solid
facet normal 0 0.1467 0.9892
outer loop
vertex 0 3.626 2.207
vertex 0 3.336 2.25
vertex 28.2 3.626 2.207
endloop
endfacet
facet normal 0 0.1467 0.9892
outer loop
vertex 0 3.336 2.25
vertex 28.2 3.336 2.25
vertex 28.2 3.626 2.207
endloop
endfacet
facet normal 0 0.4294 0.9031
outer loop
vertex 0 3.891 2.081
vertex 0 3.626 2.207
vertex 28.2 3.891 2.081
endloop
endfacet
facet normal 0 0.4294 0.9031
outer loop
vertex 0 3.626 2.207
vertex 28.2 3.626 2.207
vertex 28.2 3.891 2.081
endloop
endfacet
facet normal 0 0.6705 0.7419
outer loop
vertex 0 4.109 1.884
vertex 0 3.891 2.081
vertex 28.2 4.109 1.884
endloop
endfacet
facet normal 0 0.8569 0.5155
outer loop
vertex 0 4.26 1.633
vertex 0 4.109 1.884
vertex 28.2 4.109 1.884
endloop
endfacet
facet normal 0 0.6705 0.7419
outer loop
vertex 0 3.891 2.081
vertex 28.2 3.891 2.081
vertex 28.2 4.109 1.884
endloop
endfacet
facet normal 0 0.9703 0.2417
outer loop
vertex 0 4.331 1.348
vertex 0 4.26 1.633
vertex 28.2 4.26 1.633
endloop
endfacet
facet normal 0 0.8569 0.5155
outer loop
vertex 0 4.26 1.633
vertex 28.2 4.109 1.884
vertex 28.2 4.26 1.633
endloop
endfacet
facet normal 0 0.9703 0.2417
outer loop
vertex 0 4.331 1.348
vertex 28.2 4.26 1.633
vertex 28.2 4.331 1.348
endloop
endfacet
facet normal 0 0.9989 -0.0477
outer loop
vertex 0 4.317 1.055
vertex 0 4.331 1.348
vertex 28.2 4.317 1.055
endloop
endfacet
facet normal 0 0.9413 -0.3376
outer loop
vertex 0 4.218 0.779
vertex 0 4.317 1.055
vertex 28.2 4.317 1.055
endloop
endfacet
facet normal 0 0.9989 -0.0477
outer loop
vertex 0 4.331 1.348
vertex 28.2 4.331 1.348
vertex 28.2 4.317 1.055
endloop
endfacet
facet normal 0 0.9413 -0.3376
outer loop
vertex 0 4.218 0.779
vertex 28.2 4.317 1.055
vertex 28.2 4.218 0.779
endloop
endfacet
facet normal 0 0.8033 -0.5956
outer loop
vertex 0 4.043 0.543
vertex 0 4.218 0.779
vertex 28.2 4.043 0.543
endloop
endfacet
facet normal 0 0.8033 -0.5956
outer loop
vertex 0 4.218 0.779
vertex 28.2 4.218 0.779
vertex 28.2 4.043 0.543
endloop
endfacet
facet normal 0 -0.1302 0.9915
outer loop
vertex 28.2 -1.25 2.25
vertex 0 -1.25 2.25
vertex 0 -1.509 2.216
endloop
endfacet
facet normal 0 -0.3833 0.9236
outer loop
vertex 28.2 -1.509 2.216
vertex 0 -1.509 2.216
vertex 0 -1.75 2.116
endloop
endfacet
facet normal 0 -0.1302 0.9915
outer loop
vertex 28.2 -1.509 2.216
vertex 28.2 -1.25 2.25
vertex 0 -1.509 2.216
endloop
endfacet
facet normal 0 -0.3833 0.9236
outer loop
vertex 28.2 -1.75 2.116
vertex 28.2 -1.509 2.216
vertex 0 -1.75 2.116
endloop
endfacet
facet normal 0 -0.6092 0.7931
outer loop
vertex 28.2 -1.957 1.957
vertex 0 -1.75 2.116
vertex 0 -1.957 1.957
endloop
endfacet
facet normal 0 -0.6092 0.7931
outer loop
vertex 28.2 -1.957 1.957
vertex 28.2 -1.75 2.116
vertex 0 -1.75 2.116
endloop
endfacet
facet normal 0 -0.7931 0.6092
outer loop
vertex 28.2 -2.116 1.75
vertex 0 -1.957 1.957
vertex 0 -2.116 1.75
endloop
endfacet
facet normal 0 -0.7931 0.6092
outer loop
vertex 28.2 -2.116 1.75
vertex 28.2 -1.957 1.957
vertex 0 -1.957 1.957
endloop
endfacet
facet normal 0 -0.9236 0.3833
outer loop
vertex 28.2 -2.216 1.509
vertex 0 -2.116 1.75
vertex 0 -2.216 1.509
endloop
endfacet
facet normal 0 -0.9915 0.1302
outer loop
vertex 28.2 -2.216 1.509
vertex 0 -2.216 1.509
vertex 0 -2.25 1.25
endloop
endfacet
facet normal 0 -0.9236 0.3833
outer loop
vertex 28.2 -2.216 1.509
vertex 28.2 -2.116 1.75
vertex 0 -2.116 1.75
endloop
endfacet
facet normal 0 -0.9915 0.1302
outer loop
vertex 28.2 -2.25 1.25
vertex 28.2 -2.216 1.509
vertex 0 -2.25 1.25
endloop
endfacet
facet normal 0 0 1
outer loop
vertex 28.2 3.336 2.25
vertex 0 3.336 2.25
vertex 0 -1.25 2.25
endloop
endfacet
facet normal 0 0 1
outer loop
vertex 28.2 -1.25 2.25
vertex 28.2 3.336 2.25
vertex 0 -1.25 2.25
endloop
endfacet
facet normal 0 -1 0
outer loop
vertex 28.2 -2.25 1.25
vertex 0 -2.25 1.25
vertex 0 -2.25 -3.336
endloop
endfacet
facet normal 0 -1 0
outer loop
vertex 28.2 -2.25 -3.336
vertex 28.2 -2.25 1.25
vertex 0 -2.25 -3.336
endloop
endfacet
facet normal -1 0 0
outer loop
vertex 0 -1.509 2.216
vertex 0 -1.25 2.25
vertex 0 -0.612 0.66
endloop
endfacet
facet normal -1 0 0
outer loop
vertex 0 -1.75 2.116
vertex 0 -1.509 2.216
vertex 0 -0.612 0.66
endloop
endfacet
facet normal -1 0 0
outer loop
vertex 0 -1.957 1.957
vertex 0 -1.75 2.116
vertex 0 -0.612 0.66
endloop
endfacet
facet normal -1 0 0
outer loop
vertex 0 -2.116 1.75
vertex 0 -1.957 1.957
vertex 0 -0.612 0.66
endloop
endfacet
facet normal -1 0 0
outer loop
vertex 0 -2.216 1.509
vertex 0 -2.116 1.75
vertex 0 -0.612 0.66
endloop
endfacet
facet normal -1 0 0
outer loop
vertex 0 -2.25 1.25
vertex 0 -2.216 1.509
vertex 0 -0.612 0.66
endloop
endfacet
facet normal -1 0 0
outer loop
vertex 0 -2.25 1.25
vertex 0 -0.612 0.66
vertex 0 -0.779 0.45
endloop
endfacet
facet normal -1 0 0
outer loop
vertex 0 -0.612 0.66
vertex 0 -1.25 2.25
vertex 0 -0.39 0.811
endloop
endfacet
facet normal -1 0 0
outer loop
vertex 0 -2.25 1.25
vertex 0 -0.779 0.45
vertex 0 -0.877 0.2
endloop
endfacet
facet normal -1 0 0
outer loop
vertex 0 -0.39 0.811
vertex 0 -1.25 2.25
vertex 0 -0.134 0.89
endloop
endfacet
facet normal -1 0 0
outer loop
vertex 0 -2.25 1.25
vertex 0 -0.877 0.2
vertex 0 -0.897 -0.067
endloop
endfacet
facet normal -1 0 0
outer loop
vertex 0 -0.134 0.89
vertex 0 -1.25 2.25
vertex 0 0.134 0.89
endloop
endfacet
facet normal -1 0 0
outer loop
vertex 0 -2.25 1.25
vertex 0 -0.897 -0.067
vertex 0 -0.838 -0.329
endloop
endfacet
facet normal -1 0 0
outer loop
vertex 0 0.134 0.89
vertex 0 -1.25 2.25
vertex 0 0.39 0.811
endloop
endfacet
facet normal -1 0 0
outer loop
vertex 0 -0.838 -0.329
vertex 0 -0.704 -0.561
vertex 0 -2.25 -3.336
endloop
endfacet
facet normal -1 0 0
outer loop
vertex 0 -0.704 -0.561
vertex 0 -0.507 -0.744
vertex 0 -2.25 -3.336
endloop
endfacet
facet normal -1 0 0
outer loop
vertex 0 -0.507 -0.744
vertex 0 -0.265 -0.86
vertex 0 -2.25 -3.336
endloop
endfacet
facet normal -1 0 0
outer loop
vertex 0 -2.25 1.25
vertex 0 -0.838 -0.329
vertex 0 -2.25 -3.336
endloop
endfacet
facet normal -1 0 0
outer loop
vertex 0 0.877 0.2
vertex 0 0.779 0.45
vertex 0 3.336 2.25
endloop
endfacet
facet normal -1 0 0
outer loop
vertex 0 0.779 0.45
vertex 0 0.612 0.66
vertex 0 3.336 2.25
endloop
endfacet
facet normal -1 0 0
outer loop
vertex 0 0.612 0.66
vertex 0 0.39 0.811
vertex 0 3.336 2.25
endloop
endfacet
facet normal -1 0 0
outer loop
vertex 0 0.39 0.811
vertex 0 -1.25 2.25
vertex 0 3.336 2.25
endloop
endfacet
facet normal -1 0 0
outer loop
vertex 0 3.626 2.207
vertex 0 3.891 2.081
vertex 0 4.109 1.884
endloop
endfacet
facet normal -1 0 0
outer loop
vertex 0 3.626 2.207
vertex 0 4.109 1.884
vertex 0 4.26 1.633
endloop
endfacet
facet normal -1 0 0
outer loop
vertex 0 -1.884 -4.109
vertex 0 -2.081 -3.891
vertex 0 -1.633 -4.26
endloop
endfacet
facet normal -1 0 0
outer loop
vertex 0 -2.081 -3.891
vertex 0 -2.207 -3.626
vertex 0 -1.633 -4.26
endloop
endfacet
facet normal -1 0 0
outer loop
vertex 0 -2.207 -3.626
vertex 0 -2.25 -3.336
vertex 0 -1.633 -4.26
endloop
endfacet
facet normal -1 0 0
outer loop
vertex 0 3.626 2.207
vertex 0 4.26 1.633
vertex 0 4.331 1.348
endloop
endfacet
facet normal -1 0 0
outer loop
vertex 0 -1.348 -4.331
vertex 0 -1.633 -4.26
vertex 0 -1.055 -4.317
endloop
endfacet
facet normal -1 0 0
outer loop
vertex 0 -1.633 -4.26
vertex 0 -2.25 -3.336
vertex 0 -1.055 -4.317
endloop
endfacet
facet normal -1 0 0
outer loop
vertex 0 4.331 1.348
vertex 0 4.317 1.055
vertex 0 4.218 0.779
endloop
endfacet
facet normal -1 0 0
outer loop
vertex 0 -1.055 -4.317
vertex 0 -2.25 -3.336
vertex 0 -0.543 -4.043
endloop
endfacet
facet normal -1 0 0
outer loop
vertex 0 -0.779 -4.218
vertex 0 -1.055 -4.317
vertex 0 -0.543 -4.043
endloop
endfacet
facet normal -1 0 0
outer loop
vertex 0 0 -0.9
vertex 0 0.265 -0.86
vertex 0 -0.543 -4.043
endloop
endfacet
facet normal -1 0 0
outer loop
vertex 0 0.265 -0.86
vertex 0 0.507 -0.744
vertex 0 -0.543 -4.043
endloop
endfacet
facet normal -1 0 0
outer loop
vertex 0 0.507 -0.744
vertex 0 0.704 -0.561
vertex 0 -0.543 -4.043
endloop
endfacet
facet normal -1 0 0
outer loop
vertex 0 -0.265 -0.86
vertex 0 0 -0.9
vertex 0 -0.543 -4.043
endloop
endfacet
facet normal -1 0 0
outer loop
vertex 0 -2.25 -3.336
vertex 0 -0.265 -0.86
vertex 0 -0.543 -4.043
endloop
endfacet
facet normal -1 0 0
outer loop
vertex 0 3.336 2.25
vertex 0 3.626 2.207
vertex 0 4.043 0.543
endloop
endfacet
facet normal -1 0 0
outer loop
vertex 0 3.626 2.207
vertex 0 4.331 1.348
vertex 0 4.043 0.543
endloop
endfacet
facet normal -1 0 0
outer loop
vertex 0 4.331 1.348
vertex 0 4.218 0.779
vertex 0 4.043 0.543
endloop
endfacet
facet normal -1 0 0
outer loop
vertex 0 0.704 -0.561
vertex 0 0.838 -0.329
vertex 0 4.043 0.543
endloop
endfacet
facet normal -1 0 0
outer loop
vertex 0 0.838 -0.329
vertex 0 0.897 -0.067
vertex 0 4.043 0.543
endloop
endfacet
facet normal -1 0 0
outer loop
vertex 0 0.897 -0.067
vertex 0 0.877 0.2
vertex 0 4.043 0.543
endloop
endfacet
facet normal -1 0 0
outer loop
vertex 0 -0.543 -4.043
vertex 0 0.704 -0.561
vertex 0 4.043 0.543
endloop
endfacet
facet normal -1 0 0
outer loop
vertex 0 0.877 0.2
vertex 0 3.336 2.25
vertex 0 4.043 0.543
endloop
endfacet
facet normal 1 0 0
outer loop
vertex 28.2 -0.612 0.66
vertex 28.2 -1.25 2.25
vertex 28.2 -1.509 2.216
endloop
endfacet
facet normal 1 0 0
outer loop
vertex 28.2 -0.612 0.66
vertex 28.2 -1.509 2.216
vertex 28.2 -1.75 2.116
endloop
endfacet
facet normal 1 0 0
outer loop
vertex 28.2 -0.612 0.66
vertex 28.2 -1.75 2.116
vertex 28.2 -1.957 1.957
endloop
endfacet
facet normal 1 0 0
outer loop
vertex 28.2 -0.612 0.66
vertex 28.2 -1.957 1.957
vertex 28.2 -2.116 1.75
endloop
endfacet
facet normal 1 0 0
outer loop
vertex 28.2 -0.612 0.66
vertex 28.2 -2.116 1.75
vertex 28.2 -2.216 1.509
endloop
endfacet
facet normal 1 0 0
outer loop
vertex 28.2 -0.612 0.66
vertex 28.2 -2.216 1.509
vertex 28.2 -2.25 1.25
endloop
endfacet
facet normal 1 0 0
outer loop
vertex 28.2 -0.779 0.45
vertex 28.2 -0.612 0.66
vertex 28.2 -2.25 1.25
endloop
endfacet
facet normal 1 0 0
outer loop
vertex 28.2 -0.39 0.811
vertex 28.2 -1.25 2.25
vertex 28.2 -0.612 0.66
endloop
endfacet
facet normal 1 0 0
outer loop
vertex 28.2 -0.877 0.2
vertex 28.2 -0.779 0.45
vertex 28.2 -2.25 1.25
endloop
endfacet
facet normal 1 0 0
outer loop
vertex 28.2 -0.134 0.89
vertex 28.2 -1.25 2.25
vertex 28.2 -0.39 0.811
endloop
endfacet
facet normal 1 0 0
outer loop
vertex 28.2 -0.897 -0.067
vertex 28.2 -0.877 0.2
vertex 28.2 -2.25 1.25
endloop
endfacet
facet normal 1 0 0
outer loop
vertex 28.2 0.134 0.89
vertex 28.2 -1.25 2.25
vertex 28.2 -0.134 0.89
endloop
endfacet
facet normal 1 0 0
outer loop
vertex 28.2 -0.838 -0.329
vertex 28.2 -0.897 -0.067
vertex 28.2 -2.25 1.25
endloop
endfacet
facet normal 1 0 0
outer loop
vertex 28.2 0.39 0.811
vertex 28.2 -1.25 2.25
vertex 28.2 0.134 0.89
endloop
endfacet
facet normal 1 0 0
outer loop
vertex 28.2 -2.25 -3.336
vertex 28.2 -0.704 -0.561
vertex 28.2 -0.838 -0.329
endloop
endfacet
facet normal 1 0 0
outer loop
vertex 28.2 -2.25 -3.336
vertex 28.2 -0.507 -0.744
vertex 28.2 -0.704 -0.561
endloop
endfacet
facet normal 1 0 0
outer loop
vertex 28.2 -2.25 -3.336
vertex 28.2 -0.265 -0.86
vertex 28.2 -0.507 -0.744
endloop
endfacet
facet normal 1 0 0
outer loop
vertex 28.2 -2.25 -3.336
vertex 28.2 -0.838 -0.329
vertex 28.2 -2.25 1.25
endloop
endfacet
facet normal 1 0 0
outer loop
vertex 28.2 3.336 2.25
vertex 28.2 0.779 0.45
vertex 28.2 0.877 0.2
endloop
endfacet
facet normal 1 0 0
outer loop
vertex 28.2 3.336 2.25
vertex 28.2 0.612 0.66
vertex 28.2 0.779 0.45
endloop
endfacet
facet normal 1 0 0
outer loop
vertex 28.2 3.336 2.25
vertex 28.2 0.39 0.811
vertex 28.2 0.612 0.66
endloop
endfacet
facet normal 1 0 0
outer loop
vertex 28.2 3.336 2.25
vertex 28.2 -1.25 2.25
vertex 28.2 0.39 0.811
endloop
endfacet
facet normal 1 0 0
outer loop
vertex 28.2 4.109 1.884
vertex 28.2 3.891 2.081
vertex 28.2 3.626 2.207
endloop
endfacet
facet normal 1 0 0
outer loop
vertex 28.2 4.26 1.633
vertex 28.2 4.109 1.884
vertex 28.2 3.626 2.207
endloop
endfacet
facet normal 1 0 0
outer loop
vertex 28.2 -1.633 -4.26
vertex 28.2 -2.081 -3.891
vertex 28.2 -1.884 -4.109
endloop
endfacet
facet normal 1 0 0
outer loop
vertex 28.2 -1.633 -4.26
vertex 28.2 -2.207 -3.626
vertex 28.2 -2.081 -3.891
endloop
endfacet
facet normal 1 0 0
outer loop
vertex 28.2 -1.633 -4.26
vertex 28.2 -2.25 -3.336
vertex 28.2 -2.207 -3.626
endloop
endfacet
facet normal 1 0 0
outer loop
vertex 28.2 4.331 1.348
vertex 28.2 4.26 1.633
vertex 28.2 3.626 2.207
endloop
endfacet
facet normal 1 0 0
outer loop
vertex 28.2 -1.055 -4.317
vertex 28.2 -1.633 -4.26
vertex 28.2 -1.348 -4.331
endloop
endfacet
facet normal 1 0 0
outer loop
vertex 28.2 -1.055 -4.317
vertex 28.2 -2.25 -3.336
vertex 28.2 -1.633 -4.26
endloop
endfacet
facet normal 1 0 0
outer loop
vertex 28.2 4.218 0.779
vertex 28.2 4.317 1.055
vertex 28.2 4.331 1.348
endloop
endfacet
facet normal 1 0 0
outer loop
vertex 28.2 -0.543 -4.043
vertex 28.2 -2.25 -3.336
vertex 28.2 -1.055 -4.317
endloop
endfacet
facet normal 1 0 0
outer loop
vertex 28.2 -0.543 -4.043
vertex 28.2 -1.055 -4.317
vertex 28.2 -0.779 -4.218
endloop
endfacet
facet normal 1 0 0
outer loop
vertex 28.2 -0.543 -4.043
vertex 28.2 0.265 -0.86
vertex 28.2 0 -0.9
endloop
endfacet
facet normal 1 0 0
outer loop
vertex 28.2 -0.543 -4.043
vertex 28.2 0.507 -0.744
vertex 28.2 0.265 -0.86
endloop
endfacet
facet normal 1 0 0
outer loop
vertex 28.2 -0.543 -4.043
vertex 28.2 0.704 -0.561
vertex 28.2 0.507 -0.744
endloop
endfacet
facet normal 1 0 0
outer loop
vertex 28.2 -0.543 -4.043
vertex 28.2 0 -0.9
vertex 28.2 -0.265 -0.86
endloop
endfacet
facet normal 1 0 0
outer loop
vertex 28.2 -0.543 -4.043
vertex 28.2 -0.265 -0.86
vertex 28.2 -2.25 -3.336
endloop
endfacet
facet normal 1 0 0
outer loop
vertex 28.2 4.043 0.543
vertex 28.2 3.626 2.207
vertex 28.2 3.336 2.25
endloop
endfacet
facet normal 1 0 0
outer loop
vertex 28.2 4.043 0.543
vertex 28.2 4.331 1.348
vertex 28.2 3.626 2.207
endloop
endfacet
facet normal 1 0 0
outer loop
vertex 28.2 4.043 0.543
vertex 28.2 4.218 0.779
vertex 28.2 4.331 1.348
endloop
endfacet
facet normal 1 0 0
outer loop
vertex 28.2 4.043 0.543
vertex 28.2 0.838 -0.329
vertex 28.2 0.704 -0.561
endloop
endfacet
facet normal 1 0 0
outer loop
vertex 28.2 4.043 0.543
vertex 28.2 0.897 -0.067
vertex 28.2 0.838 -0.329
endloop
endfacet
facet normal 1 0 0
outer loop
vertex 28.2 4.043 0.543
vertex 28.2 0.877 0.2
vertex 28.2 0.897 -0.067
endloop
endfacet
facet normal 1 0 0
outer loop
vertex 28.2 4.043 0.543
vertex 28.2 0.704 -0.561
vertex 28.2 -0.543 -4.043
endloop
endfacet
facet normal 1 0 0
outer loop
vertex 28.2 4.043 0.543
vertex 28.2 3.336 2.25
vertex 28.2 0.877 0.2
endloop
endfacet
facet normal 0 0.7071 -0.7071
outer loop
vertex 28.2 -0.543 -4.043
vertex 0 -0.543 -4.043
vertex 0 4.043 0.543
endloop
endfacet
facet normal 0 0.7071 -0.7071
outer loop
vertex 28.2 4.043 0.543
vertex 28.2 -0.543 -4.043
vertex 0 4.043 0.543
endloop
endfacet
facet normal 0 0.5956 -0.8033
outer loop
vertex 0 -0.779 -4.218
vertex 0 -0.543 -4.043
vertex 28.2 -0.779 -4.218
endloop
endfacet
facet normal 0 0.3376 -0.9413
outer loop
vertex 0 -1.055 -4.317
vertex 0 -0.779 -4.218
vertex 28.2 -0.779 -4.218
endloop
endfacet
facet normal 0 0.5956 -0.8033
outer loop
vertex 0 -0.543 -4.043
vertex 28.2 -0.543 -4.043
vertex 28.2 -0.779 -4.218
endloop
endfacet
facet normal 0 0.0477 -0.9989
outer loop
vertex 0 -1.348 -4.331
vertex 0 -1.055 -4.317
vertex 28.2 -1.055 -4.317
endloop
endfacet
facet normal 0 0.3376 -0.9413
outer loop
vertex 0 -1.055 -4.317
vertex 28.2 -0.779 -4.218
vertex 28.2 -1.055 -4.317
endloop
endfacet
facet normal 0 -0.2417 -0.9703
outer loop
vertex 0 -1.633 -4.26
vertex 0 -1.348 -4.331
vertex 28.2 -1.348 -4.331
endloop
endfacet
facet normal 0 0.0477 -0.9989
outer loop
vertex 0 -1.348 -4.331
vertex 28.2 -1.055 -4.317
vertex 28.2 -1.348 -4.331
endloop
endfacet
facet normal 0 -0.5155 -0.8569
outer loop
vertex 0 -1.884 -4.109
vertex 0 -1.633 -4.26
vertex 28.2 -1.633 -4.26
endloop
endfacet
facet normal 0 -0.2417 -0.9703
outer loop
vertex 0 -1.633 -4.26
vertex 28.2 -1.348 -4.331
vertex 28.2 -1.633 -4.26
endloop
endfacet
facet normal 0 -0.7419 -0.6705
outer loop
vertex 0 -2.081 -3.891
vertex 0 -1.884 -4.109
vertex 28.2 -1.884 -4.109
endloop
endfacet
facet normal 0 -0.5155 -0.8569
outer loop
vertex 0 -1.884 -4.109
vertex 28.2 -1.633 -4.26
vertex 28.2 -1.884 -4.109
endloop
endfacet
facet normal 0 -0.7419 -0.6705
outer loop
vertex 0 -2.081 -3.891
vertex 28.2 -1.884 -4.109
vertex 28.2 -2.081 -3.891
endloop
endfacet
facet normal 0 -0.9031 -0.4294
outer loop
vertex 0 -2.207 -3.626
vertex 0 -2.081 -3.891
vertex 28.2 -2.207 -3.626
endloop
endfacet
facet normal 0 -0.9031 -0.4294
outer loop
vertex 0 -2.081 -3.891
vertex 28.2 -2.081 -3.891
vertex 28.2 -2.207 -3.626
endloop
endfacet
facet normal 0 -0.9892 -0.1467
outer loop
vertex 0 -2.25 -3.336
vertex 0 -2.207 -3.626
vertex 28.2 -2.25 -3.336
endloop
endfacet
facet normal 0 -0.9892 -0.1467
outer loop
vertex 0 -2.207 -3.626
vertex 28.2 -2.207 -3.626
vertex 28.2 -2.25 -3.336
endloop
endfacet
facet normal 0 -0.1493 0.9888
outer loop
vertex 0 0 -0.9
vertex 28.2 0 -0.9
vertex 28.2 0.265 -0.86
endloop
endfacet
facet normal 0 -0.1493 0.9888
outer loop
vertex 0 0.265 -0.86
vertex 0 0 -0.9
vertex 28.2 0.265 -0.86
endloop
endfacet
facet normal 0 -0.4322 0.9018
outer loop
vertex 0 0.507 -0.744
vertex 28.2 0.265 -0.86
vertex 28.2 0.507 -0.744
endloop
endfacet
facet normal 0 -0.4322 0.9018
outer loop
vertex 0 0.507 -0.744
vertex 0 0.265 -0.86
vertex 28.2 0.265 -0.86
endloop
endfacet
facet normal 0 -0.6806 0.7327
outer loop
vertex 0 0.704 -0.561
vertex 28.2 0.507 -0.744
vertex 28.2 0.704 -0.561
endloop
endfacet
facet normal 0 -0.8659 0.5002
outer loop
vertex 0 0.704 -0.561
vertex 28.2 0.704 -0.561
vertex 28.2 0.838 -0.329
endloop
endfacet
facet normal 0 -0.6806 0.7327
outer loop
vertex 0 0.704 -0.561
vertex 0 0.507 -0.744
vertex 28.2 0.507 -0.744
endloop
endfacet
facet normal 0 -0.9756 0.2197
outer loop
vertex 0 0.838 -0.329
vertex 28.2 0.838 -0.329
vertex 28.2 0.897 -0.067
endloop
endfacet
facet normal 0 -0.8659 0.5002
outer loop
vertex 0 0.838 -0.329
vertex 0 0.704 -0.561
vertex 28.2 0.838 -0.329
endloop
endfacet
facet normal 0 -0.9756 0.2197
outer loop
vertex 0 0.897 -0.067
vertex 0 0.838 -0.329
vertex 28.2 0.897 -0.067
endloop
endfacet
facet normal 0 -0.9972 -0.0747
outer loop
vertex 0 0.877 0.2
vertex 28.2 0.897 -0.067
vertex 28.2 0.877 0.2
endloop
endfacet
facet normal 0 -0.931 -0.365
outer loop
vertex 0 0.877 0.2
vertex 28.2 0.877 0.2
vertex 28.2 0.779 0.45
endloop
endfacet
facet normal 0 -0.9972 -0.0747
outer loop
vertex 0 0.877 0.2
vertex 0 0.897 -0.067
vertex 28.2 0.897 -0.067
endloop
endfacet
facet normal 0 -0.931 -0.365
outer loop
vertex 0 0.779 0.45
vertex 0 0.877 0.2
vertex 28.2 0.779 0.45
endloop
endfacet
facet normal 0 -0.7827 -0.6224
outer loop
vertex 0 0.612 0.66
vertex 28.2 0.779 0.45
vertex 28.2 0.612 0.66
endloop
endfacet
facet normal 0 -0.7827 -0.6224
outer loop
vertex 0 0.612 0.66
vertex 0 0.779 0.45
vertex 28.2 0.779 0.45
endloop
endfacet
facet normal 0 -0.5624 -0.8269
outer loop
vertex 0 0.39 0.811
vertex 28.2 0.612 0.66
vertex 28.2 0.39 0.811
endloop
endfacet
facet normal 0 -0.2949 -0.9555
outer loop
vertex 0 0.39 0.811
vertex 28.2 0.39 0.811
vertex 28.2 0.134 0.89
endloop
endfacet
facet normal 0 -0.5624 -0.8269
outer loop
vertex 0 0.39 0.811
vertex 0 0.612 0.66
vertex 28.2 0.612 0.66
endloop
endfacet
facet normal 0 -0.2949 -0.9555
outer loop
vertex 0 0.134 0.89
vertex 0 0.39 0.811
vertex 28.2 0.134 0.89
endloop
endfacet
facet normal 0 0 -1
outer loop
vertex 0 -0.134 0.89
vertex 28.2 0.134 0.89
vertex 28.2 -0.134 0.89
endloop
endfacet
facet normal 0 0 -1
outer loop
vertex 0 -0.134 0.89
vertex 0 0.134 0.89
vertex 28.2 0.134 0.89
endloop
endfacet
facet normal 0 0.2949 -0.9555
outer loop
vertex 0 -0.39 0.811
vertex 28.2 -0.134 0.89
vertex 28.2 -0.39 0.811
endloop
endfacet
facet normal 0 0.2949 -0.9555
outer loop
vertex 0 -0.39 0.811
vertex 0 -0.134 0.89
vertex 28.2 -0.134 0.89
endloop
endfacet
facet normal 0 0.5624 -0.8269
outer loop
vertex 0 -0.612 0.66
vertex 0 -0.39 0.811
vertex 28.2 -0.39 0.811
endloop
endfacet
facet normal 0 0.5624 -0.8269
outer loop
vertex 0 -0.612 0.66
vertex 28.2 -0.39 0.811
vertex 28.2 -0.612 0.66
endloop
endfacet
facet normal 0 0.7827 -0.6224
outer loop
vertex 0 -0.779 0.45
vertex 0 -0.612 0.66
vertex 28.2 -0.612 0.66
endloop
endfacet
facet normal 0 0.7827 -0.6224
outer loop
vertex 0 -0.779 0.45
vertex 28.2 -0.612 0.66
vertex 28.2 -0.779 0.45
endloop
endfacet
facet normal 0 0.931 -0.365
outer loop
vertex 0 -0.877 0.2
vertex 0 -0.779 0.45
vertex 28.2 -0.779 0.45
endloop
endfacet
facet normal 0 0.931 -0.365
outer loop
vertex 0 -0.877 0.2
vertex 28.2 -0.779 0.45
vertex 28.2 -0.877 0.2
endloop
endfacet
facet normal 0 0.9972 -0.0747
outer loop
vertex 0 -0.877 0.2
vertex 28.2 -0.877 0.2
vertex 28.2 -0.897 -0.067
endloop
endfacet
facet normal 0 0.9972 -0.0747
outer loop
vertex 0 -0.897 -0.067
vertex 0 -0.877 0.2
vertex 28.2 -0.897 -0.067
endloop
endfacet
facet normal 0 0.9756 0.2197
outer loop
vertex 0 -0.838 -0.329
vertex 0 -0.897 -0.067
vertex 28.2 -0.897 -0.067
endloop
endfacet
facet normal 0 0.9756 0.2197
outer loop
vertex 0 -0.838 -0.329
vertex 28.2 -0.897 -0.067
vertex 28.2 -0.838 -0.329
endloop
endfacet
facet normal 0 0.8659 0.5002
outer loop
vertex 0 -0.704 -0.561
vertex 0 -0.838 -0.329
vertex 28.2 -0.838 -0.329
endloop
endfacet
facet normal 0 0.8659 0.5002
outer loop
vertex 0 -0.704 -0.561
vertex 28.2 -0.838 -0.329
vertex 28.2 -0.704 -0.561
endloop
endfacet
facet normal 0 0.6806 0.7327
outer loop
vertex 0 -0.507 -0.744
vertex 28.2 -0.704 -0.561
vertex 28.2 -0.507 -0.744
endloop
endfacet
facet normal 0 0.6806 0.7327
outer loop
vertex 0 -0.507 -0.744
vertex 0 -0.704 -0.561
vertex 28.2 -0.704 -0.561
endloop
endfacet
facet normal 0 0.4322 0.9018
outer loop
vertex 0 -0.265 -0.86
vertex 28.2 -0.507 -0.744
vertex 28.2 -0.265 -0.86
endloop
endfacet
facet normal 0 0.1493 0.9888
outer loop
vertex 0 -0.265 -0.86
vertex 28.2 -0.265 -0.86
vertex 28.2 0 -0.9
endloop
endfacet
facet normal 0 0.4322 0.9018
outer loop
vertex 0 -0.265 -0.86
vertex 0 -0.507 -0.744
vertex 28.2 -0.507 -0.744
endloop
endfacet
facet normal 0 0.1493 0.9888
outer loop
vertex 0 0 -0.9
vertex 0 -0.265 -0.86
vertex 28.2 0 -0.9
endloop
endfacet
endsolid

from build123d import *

# Parameters (mm, degrees)
SKETCH1_R           = 0.9
BOSS_EXTRUDE1_DEPTH = 28.2
FILLET1_R           = 1


with BuildPart() as part:
    # Sketch1 → Boss-Extrude1 (new body)
    with BuildSketch(Plane(origin=(0, 0, 0), x_dir=(0, 0, -1), z_dir=(1, 0, 0))):
        Polygon((-2.25, 5.75), (-2.25, -2.25), (5.75, -2.25), align=None)
        Circle(SKETCH1_R, mode=Mode.SUBTRACT)
    extrude(amount=BOSS_EXTRUDE1_DEPTH)

    # Fillet1
    fillet1_edges = [part.edges().sort_by_distance(p)[0] for p in [
        (14.1, -2.25, -5.75),
        (14.1, -2.25, 2.25),
        (14.1, 5.75, 2.25),
    ]]
    fillet(fillet1_edges, radius=FILLET1_R)


solid = part.part
